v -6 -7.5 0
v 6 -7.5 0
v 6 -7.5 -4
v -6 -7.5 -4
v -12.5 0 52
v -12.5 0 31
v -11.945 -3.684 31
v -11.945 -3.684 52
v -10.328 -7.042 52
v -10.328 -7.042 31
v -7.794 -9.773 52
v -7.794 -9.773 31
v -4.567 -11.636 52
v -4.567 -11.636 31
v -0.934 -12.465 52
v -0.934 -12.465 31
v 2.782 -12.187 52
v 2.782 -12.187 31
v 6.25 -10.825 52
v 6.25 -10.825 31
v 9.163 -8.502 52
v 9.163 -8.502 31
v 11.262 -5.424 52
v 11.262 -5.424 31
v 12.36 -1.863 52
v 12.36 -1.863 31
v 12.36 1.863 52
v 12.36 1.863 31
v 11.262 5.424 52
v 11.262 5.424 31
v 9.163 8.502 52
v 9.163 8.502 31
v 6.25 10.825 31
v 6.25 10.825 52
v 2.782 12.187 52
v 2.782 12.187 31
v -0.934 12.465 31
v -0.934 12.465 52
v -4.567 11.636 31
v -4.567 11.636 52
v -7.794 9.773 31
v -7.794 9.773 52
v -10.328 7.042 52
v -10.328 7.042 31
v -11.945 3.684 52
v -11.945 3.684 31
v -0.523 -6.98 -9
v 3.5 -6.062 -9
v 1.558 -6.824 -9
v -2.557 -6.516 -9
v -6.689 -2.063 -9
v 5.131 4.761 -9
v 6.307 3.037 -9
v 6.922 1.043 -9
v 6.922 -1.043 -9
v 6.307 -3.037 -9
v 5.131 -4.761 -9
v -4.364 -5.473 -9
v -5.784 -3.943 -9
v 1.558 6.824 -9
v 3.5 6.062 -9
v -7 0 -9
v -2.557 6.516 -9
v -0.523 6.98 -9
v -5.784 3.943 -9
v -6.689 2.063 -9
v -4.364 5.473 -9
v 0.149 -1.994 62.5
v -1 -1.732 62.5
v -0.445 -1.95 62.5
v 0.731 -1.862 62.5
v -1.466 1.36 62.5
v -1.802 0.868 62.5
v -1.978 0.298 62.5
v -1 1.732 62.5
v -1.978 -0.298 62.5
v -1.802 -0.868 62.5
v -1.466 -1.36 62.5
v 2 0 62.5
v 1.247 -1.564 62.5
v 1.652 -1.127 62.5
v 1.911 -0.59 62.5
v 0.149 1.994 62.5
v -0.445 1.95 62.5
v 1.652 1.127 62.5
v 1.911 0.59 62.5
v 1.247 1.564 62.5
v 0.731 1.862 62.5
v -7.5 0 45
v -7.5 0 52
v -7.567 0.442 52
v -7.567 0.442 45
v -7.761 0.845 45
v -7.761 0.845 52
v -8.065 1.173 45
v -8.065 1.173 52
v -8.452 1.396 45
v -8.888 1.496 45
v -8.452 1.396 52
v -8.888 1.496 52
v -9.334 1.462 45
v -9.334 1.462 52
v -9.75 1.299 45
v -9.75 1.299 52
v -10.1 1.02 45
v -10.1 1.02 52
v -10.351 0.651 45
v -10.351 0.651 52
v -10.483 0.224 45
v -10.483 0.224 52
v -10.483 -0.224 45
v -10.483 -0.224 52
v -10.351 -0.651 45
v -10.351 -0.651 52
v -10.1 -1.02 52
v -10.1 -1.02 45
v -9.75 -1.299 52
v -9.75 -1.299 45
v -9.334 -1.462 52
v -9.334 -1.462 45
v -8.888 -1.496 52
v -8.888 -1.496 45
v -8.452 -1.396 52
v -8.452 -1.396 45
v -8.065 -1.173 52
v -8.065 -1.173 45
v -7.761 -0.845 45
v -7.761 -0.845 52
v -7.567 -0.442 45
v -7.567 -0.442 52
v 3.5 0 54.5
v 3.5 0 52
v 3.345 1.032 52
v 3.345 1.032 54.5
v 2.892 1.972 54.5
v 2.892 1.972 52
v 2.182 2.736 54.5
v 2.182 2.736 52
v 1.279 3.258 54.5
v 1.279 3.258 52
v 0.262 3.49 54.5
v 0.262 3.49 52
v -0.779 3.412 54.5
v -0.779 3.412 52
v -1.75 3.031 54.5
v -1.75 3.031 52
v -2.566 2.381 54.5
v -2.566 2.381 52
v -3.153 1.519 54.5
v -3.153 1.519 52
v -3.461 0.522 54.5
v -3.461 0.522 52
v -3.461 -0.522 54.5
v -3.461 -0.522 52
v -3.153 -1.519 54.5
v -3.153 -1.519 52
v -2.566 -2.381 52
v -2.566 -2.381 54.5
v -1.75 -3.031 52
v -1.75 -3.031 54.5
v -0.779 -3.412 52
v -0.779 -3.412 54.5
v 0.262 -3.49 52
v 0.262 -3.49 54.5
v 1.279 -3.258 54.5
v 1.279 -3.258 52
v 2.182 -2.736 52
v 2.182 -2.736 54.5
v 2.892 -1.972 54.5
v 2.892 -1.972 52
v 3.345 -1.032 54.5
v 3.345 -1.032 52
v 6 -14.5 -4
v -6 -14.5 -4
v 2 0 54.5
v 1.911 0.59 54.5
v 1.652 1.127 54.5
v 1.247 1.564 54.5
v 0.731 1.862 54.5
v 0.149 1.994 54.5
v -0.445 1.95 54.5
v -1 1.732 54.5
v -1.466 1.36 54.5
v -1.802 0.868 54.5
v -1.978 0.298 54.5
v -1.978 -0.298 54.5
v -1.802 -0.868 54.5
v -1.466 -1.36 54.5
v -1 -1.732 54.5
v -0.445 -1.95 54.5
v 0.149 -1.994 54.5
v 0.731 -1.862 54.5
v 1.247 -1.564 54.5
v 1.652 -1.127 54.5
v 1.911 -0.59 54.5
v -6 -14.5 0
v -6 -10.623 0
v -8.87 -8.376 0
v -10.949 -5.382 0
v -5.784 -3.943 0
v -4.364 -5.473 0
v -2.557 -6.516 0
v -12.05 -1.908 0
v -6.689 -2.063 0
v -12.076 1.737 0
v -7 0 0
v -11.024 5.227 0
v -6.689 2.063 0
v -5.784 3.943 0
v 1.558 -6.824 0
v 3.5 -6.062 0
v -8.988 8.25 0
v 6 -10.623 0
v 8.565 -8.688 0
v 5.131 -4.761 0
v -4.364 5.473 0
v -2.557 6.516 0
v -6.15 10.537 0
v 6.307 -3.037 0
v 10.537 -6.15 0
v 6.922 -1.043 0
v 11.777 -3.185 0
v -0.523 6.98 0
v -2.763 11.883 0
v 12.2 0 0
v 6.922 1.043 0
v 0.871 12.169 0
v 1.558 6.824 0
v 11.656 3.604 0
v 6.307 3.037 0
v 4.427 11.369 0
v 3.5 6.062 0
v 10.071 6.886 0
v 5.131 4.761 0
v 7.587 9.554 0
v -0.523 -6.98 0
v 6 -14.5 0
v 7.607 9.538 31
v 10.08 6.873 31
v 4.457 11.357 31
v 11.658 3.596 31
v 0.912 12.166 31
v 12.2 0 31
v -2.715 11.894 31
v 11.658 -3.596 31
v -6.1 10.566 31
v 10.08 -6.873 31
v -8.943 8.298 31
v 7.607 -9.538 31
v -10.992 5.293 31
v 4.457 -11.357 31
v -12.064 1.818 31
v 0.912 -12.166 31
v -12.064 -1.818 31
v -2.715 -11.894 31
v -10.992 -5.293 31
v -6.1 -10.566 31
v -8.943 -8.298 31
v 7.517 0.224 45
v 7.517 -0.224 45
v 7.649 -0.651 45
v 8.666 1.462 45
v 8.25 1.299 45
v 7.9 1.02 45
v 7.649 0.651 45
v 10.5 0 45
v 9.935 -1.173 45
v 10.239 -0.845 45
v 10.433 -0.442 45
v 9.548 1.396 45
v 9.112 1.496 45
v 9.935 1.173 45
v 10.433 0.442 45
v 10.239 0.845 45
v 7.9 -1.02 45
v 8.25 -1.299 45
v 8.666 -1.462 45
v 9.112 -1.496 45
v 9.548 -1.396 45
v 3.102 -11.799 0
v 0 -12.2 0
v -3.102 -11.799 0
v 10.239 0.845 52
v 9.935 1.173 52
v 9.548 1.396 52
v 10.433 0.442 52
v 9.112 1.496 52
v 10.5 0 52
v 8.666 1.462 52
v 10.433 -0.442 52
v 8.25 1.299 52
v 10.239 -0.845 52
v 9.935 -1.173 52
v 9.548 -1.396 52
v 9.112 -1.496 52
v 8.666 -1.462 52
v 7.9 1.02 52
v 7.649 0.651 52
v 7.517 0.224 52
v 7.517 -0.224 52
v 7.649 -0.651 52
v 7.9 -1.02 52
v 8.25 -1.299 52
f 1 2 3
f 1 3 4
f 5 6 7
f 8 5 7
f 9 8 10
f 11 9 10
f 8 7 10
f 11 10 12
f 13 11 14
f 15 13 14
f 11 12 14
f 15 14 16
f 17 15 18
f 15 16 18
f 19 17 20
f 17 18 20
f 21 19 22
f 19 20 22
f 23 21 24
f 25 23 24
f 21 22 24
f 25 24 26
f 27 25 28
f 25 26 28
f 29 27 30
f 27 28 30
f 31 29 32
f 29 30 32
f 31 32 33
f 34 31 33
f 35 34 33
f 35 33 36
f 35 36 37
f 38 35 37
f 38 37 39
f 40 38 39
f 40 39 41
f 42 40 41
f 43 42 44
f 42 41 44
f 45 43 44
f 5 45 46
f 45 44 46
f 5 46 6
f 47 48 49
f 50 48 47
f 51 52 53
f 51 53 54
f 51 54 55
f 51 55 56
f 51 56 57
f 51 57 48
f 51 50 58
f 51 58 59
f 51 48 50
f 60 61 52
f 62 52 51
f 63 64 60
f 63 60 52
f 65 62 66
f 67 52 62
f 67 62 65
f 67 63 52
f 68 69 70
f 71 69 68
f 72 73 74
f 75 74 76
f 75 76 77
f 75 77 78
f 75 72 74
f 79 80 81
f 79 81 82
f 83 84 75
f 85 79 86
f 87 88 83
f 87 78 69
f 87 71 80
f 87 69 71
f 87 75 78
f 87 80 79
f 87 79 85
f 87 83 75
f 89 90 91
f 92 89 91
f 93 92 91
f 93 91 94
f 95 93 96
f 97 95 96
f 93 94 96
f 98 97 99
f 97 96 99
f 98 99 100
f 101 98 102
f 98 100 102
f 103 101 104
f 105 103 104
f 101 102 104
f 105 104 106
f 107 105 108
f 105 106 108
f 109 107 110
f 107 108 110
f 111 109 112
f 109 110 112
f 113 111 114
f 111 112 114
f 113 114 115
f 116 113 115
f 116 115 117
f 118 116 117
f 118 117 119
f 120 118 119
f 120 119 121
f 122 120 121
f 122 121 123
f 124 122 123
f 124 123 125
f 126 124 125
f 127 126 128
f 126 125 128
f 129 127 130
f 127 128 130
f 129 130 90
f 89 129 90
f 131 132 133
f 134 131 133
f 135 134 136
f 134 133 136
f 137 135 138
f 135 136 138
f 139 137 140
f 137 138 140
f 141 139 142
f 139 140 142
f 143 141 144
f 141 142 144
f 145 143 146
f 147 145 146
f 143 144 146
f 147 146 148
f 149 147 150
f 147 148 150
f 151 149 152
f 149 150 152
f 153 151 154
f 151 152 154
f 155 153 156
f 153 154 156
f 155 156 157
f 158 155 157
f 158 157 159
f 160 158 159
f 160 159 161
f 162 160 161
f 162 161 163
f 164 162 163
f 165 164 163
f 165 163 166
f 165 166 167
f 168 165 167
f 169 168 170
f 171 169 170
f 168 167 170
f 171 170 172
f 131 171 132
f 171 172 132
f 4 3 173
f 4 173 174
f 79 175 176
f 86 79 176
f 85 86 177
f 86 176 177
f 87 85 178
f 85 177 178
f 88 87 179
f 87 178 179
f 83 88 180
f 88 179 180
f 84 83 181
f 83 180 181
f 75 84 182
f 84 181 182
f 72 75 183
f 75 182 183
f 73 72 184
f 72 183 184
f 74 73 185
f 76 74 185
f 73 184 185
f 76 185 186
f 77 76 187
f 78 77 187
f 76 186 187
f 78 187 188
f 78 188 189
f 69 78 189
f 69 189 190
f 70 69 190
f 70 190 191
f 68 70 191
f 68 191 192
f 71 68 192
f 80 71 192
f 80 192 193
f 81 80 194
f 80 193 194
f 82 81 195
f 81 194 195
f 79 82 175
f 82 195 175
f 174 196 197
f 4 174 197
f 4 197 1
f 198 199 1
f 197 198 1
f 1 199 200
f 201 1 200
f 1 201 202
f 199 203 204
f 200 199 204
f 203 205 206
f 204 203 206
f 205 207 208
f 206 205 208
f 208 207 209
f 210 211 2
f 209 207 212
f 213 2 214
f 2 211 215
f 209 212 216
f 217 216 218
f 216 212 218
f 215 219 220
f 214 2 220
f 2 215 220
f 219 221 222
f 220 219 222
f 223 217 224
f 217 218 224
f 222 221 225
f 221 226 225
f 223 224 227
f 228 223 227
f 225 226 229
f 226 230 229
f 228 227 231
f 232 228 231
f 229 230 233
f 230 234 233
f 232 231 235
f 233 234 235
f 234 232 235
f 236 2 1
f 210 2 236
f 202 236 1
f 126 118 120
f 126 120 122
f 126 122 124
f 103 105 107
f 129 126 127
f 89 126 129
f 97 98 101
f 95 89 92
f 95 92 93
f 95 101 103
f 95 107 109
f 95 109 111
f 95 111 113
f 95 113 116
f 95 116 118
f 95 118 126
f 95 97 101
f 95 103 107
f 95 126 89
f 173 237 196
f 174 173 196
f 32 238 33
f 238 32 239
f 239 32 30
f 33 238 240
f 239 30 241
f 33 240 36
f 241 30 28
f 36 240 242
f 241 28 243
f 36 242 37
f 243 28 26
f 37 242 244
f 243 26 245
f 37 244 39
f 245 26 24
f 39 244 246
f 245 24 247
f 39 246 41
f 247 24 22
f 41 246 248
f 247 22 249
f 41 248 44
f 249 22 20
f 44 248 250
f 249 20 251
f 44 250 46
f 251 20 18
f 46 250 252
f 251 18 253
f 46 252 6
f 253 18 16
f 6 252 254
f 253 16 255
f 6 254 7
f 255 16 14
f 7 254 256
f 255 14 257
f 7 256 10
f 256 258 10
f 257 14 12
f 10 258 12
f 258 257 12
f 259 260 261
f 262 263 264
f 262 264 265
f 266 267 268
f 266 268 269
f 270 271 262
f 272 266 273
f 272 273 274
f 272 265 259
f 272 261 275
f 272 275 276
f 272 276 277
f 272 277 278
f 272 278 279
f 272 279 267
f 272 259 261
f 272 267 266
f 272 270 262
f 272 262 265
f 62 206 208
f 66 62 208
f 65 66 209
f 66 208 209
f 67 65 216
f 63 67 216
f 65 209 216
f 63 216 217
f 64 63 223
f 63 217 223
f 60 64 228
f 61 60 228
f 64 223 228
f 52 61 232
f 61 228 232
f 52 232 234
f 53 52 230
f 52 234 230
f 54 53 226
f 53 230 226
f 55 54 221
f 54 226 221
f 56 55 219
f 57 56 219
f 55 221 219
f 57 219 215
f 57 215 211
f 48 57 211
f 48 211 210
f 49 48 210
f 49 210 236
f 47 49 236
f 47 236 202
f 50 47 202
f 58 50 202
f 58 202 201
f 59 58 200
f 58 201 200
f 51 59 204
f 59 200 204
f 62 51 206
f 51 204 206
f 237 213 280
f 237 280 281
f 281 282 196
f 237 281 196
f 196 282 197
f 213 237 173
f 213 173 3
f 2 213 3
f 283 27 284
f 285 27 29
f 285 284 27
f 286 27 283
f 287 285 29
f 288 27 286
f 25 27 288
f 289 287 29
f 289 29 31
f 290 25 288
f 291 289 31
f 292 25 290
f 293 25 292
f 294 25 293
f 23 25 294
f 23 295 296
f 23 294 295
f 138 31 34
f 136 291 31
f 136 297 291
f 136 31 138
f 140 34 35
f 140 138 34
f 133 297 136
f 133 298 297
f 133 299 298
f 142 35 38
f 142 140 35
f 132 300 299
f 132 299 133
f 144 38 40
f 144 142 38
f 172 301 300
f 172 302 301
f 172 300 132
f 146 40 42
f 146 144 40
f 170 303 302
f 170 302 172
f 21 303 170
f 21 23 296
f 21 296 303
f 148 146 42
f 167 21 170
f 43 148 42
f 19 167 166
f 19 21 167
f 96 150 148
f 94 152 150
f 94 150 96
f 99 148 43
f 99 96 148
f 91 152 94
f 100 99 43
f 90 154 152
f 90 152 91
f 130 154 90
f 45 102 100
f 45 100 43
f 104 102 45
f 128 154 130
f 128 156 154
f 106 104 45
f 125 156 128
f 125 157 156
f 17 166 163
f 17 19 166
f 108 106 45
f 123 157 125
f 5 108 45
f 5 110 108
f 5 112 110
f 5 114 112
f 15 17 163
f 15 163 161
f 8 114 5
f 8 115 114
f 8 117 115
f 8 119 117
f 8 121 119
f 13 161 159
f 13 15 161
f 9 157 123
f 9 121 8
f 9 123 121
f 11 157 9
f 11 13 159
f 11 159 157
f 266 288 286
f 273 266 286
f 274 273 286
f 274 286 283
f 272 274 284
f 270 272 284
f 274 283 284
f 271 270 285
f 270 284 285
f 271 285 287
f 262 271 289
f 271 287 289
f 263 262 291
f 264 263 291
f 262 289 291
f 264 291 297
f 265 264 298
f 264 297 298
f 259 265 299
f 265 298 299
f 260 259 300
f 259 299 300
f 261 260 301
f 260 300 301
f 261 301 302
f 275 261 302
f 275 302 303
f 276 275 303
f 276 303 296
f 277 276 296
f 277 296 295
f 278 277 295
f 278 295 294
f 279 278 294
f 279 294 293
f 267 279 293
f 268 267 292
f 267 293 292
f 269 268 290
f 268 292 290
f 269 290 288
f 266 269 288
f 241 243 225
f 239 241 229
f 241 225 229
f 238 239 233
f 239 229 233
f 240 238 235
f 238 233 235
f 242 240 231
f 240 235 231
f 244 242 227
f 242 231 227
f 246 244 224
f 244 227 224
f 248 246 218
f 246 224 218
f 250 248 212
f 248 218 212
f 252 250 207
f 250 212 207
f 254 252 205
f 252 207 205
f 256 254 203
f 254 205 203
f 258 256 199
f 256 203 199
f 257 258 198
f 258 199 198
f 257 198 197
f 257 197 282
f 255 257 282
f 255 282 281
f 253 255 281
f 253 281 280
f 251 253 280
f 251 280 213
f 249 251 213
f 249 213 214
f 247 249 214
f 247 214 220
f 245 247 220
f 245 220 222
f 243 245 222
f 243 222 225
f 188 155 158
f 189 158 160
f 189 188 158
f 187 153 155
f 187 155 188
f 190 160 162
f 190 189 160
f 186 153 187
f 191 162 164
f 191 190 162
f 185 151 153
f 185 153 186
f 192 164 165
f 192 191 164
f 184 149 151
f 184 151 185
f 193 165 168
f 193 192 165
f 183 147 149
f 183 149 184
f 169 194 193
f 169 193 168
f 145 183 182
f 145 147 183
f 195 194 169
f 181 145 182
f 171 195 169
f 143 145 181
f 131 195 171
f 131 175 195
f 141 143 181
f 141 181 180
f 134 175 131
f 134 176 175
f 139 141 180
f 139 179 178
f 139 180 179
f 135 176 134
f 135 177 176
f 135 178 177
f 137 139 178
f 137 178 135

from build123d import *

# Parameters (mm, degrees)
SKETCH1_R           = 12.2
BOSS_EXTRUDE1_DEPTH = 31
SKETCH2_R           = 12.5
BOSS_EXTRUDE2_DEPTH = 21
SKETCH3_R           = 3.5
BOSS_EXTRUDE3_DEPTH = 2.5
SKETCH4_R           = 2
BOSS_EXTRUDE4_DEPTH = 8
SKETCH5_R           = 7
BOSS_EXTRUDE5_DEPTH = 9
SKETCH6_W           = 12
SKETCH6_H           = 7
BOSS_EXTRUDE6_DEPTH = 4
SKETCH7_R           = 1.5
CUT_EXTRUDE1_DEPTH  = 7


with BuildPart() as part:
    # Sketch1 → Boss-Extrude1 (new body)
    with BuildSketch(Plane.XY):
        Circle(SKETCH1_R)
    extrude(amount=BOSS_EXTRUDE1_DEPTH)

    # Sketch2 → Boss-Extrude2 (add)
    with BuildSketch(Plane.XY.offset(31)):
        with Locations(Location((0, 0, 0), (0, 0, 180))):
            Circle(SKETCH2_R)
    extrude(amount=BOSS_EXTRUDE2_DEPTH)

    # Sketch3 → Boss-Extrude3 (add)
    with BuildSketch(Plane.XY.offset(52)):
        Circle(SKETCH3_R)
    extrude(amount=BOSS_EXTRUDE3_DEPTH)

    # Sketch4 → Boss-Extrude4 (add)
    with BuildSketch(Plane.XY.offset(54.5)):
        Circle(SKETCH4_R)
    extrude(amount=BOSS_EXTRUDE4_DEPTH)

    # Sketch5 → Boss-Extrude5 (add)
    with BuildSketch(Plane(origin=(0, 0, 0), x_dir=(-1, 0, 0), z_dir=(0, 0, -1))):
        Circle(SKETCH5_R)
    extrude(amount=BOSS_EXTRUDE5_DEPTH)

    # Sketch6 → Boss-Extrude6 (add)
    with BuildSketch(Plane(origin=(0, 0, 0), x_dir=(-1, 0, 0), z_dir=(0, 0, -1))):
        with Locations((0, -11)):
            Rectangle(SKETCH6_W, SKETCH6_H)
    extrude(amount=BOSS_EXTRUDE6_DEPTH)

    # Sketch7 → Cut-Extrude1 (cut)
    with BuildSketch(Plane.XY.offset(52)):
        with Locations((-9, 0)):
            Circle(SKETCH7_R)
        with Locations((9, 0)):
            Circle(SKETCH7_R)
    extrude(amount=-CUT_EXTRUDE1_DEPTH, mode=Mode.SUBTRACT)


solid = part.part
